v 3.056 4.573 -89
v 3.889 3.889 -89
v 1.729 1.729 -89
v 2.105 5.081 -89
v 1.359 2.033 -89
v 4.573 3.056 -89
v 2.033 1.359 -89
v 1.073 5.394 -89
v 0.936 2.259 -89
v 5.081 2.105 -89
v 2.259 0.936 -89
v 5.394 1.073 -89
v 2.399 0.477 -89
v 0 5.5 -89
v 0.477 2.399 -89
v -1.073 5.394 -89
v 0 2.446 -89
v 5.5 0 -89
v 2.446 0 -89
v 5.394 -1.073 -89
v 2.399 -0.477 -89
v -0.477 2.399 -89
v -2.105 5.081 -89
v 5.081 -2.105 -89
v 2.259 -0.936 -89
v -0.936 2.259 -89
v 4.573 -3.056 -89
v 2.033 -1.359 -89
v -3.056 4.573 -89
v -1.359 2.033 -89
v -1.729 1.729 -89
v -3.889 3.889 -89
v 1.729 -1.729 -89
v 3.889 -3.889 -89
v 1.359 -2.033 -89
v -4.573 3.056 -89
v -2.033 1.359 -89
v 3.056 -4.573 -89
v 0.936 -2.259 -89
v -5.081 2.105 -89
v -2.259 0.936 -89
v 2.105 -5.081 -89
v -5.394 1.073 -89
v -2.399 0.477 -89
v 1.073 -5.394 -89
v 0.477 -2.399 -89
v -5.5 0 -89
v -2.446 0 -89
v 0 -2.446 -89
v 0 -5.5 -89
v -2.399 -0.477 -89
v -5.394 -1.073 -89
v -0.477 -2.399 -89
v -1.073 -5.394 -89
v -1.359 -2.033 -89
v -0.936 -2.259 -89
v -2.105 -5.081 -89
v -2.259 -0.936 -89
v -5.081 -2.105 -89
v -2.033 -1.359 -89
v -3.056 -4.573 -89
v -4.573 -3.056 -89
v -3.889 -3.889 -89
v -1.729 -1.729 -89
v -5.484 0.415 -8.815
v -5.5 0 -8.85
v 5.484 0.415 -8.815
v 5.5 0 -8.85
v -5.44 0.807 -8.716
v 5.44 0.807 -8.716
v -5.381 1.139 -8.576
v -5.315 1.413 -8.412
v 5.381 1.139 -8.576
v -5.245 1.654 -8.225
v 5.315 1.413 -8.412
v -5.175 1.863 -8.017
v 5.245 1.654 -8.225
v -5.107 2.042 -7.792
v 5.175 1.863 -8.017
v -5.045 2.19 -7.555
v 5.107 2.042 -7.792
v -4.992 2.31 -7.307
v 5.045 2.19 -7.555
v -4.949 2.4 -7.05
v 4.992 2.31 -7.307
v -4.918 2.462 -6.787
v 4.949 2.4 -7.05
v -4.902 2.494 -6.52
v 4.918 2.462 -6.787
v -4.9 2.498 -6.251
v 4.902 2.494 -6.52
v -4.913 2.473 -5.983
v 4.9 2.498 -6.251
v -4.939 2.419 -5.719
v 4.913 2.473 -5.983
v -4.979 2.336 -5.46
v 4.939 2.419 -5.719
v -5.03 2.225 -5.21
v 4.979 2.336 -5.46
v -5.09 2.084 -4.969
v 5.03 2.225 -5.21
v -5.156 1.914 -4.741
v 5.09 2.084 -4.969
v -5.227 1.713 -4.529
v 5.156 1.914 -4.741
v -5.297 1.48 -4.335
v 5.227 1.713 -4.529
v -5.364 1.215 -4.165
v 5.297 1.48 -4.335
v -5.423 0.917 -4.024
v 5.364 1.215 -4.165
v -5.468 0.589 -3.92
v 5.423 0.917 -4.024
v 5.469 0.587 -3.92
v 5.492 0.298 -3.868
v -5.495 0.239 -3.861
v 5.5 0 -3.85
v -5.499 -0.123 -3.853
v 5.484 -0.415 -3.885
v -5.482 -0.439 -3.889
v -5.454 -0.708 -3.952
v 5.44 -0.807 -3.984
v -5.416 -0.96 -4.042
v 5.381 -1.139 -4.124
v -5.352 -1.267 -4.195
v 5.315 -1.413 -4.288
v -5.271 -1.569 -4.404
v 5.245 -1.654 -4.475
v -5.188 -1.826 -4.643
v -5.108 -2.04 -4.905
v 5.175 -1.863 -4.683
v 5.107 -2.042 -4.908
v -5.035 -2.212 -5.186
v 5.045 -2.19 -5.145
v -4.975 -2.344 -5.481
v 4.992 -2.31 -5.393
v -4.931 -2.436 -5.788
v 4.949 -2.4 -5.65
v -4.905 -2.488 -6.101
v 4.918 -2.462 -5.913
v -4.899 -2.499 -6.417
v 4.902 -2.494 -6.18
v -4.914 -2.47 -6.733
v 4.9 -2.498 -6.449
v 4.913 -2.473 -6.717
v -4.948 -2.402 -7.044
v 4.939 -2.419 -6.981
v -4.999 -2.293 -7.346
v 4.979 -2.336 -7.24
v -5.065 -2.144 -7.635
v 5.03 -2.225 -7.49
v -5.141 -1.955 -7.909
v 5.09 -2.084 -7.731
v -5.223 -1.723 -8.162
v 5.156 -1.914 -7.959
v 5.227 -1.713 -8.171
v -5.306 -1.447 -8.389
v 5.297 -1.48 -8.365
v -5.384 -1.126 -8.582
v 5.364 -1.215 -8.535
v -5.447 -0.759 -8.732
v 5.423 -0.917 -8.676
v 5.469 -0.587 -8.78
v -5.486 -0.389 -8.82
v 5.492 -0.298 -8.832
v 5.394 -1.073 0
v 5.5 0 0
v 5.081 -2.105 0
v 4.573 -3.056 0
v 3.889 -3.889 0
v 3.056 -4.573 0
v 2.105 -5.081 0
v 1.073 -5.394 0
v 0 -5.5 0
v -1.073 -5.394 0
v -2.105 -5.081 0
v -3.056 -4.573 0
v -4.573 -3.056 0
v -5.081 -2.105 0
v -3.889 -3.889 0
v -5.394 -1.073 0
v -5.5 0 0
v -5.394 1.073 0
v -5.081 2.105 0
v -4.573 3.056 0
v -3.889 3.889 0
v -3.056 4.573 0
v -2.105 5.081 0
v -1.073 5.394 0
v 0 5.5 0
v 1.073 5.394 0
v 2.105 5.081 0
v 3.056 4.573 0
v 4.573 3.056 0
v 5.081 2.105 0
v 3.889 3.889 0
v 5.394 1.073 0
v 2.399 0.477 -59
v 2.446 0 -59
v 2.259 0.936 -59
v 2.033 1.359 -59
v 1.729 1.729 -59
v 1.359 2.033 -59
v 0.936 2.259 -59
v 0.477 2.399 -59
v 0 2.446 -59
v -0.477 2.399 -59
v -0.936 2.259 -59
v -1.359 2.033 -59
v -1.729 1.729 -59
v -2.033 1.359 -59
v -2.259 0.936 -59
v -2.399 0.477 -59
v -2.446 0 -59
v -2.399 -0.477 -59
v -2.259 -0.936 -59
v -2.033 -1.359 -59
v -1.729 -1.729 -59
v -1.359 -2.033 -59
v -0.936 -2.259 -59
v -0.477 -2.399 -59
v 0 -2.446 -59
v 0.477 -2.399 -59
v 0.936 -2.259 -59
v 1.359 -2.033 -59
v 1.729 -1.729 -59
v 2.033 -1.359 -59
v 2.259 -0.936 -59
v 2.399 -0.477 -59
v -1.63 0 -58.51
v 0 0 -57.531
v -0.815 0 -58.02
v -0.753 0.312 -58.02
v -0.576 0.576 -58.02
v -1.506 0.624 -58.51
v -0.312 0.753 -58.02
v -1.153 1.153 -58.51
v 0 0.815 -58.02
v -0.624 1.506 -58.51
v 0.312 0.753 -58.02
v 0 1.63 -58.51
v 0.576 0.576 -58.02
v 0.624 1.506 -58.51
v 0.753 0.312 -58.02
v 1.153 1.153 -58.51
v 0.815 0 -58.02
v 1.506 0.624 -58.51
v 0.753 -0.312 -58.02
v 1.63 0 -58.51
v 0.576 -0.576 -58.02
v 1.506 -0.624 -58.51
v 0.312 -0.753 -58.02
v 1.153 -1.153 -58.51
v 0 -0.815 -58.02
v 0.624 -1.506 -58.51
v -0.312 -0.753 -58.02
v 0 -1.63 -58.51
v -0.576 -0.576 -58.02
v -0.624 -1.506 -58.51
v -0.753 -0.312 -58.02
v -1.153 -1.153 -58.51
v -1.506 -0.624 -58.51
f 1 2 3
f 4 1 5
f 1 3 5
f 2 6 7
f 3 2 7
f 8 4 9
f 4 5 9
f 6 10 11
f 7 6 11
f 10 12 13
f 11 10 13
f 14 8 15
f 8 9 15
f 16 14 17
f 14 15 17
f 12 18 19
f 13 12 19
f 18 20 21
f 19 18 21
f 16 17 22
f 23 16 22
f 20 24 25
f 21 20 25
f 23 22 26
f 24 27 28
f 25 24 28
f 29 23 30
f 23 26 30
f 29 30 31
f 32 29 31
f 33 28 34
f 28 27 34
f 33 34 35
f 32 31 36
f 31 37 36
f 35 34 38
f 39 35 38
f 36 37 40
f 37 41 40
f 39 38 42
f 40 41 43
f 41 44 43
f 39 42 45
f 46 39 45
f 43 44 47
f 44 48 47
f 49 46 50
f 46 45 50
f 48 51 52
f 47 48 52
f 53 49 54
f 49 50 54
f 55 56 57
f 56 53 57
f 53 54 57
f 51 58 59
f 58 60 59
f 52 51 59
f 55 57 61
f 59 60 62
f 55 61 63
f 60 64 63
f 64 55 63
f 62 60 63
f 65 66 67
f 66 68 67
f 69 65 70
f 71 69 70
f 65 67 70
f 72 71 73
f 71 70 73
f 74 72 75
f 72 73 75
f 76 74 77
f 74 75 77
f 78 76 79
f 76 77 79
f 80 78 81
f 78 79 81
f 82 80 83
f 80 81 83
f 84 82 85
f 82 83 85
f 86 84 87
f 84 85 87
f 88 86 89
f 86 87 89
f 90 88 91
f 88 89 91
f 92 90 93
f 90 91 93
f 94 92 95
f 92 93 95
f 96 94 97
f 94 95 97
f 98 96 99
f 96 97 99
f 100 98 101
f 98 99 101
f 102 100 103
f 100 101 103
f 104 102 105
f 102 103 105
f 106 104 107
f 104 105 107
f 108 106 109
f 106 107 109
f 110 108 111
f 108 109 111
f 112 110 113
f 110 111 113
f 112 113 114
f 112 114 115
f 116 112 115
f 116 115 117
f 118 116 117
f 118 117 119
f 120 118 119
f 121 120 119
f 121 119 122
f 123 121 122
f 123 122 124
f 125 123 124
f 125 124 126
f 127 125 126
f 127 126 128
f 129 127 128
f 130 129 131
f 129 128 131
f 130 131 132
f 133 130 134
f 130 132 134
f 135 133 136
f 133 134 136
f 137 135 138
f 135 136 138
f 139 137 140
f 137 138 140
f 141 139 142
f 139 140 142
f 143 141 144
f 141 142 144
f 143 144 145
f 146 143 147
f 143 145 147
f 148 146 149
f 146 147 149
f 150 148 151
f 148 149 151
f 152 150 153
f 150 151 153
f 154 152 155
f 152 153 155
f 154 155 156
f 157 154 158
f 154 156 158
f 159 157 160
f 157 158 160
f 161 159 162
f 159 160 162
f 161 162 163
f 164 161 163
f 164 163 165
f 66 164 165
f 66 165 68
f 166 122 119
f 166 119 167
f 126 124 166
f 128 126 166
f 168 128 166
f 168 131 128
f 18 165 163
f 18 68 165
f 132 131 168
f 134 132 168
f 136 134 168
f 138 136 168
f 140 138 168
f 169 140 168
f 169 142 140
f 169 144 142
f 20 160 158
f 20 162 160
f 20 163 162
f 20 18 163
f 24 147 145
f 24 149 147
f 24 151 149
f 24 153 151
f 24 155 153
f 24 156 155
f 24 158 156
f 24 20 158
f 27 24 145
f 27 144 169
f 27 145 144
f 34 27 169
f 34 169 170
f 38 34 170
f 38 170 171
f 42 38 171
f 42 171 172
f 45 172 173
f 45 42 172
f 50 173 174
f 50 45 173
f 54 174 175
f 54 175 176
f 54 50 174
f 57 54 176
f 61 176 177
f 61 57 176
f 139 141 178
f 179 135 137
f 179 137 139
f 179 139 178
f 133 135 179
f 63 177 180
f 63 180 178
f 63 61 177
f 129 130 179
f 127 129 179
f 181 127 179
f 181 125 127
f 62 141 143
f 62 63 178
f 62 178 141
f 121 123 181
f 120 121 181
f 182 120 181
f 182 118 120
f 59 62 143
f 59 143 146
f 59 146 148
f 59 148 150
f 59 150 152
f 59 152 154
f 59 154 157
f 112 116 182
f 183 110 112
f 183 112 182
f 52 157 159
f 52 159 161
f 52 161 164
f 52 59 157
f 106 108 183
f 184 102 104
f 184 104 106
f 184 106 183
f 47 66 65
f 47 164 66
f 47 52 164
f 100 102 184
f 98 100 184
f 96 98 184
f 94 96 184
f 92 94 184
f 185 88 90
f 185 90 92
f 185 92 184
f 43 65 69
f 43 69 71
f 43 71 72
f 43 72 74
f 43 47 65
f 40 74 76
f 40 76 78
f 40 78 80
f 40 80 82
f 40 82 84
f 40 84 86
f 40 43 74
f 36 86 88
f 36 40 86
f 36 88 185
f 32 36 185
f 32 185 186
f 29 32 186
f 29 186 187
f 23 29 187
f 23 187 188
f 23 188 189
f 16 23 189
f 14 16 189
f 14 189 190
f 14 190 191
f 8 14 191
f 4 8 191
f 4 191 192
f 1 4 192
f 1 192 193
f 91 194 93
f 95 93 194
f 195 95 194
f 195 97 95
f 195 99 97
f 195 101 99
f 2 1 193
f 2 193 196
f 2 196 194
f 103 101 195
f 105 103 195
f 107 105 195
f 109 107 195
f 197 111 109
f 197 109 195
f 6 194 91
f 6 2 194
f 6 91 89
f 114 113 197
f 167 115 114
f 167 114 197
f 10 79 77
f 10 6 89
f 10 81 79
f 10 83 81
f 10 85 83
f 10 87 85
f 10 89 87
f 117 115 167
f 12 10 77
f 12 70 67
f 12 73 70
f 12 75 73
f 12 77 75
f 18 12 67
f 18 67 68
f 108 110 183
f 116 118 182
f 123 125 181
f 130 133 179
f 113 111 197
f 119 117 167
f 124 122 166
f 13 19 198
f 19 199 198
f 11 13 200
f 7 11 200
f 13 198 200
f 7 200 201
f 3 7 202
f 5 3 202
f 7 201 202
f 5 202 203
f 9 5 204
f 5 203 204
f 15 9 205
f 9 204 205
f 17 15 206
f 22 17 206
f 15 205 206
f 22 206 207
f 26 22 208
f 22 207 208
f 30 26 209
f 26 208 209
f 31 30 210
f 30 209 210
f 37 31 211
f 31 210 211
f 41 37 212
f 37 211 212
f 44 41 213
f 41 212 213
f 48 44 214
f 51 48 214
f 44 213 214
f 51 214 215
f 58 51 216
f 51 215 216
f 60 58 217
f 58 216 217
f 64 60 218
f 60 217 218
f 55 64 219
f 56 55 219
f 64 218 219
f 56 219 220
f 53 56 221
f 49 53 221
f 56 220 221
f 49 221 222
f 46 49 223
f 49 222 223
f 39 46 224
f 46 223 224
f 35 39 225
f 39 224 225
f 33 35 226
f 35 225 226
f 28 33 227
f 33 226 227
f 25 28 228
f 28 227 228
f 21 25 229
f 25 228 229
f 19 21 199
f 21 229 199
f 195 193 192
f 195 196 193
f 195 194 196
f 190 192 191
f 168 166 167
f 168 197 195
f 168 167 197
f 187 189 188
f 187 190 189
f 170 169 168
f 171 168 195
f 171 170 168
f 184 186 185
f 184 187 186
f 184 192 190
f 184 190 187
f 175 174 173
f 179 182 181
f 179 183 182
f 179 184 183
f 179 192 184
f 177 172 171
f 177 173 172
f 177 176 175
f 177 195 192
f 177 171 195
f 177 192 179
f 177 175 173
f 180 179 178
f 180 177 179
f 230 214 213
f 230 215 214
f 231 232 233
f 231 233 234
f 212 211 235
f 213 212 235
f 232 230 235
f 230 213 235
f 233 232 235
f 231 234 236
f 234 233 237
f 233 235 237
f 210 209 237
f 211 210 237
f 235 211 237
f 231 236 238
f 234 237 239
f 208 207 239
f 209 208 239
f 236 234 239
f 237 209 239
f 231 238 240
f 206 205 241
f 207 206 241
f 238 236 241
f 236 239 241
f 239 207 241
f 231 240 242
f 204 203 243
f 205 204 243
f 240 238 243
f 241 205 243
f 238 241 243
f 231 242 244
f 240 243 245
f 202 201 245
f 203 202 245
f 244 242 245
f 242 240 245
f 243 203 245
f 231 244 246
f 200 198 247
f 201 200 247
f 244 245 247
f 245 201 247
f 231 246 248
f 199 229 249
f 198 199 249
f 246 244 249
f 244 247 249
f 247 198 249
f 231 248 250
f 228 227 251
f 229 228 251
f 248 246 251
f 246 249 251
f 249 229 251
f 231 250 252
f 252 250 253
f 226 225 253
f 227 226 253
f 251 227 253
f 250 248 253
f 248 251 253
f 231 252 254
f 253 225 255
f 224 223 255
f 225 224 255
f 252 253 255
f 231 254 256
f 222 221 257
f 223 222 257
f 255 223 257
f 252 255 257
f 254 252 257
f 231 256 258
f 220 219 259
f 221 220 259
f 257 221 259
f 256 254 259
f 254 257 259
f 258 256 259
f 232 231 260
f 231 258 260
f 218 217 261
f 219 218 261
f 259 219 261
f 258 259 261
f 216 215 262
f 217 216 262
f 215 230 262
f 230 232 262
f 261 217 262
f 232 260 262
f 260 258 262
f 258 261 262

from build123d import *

# Parameters (mm, degrees)
SKETCH1_W             = 5.5
SKETCH1_H             = 89
SKETCH2_R             = 2.5
CUT_EXTRUDE1_DEPTH    = 15
M6_TAPPED_HOLE1_D     = 4.891
M6_TAPPED_HOLE1_DEPTH = 30
M6_TAPPED_HOLE1_TIP   = 1.469404644


with BuildPart() as part:
    # Sketch1 → Revolve1 (revolve)
    with BuildSketch(Plane(origin=(0, 0, 0), x_dir=(1, 0, 0), z_dir=(0, 1, 0))):
        with Locations((2.75, 44.5)):
            Rectangle(SKETCH1_W, SKETCH1_H)
    revolve(axis=Axis((0, 0, 0), (0, 0, -1)))

    # Sketch2 → Cut-Extrude1 (cut, symmetric)
    with BuildSketch(Plane(origin=(0, 0, 0), x_dir=(0, 0, -1), z_dir=(1, 0, 0))):
        with Locations((6.35, 0)):
            Circle(SKETCH2_R)
    extrude(amount=CUT_EXTRUDE1_DEPTH, both=True, mode=Mode.SUBTRACT)

    # M6 Tapped Hole1
    with Locations(Plane(origin=(0, 0, -89), x_dir=(-1, 0, 0), z_dir=(0, 0, -1))):
        with Locations((0, 0)):
            Hole(M6_TAPPED_HOLE1_D / 2, depth=M6_TAPPED_HOLE1_DEPTH)
            with Locations((0, 0, -(M6_TAPPED_HOLE1_DEPTH + M6_TAPPED_HOLE1_TIP / 2))):  # 118° drill point
                Cone(0, M6_TAPPED_HOLE1_D / 2, M6_TAPPED_HOLE1_TIP, mode=Mode.SUBTRACT)


solid = part.part
